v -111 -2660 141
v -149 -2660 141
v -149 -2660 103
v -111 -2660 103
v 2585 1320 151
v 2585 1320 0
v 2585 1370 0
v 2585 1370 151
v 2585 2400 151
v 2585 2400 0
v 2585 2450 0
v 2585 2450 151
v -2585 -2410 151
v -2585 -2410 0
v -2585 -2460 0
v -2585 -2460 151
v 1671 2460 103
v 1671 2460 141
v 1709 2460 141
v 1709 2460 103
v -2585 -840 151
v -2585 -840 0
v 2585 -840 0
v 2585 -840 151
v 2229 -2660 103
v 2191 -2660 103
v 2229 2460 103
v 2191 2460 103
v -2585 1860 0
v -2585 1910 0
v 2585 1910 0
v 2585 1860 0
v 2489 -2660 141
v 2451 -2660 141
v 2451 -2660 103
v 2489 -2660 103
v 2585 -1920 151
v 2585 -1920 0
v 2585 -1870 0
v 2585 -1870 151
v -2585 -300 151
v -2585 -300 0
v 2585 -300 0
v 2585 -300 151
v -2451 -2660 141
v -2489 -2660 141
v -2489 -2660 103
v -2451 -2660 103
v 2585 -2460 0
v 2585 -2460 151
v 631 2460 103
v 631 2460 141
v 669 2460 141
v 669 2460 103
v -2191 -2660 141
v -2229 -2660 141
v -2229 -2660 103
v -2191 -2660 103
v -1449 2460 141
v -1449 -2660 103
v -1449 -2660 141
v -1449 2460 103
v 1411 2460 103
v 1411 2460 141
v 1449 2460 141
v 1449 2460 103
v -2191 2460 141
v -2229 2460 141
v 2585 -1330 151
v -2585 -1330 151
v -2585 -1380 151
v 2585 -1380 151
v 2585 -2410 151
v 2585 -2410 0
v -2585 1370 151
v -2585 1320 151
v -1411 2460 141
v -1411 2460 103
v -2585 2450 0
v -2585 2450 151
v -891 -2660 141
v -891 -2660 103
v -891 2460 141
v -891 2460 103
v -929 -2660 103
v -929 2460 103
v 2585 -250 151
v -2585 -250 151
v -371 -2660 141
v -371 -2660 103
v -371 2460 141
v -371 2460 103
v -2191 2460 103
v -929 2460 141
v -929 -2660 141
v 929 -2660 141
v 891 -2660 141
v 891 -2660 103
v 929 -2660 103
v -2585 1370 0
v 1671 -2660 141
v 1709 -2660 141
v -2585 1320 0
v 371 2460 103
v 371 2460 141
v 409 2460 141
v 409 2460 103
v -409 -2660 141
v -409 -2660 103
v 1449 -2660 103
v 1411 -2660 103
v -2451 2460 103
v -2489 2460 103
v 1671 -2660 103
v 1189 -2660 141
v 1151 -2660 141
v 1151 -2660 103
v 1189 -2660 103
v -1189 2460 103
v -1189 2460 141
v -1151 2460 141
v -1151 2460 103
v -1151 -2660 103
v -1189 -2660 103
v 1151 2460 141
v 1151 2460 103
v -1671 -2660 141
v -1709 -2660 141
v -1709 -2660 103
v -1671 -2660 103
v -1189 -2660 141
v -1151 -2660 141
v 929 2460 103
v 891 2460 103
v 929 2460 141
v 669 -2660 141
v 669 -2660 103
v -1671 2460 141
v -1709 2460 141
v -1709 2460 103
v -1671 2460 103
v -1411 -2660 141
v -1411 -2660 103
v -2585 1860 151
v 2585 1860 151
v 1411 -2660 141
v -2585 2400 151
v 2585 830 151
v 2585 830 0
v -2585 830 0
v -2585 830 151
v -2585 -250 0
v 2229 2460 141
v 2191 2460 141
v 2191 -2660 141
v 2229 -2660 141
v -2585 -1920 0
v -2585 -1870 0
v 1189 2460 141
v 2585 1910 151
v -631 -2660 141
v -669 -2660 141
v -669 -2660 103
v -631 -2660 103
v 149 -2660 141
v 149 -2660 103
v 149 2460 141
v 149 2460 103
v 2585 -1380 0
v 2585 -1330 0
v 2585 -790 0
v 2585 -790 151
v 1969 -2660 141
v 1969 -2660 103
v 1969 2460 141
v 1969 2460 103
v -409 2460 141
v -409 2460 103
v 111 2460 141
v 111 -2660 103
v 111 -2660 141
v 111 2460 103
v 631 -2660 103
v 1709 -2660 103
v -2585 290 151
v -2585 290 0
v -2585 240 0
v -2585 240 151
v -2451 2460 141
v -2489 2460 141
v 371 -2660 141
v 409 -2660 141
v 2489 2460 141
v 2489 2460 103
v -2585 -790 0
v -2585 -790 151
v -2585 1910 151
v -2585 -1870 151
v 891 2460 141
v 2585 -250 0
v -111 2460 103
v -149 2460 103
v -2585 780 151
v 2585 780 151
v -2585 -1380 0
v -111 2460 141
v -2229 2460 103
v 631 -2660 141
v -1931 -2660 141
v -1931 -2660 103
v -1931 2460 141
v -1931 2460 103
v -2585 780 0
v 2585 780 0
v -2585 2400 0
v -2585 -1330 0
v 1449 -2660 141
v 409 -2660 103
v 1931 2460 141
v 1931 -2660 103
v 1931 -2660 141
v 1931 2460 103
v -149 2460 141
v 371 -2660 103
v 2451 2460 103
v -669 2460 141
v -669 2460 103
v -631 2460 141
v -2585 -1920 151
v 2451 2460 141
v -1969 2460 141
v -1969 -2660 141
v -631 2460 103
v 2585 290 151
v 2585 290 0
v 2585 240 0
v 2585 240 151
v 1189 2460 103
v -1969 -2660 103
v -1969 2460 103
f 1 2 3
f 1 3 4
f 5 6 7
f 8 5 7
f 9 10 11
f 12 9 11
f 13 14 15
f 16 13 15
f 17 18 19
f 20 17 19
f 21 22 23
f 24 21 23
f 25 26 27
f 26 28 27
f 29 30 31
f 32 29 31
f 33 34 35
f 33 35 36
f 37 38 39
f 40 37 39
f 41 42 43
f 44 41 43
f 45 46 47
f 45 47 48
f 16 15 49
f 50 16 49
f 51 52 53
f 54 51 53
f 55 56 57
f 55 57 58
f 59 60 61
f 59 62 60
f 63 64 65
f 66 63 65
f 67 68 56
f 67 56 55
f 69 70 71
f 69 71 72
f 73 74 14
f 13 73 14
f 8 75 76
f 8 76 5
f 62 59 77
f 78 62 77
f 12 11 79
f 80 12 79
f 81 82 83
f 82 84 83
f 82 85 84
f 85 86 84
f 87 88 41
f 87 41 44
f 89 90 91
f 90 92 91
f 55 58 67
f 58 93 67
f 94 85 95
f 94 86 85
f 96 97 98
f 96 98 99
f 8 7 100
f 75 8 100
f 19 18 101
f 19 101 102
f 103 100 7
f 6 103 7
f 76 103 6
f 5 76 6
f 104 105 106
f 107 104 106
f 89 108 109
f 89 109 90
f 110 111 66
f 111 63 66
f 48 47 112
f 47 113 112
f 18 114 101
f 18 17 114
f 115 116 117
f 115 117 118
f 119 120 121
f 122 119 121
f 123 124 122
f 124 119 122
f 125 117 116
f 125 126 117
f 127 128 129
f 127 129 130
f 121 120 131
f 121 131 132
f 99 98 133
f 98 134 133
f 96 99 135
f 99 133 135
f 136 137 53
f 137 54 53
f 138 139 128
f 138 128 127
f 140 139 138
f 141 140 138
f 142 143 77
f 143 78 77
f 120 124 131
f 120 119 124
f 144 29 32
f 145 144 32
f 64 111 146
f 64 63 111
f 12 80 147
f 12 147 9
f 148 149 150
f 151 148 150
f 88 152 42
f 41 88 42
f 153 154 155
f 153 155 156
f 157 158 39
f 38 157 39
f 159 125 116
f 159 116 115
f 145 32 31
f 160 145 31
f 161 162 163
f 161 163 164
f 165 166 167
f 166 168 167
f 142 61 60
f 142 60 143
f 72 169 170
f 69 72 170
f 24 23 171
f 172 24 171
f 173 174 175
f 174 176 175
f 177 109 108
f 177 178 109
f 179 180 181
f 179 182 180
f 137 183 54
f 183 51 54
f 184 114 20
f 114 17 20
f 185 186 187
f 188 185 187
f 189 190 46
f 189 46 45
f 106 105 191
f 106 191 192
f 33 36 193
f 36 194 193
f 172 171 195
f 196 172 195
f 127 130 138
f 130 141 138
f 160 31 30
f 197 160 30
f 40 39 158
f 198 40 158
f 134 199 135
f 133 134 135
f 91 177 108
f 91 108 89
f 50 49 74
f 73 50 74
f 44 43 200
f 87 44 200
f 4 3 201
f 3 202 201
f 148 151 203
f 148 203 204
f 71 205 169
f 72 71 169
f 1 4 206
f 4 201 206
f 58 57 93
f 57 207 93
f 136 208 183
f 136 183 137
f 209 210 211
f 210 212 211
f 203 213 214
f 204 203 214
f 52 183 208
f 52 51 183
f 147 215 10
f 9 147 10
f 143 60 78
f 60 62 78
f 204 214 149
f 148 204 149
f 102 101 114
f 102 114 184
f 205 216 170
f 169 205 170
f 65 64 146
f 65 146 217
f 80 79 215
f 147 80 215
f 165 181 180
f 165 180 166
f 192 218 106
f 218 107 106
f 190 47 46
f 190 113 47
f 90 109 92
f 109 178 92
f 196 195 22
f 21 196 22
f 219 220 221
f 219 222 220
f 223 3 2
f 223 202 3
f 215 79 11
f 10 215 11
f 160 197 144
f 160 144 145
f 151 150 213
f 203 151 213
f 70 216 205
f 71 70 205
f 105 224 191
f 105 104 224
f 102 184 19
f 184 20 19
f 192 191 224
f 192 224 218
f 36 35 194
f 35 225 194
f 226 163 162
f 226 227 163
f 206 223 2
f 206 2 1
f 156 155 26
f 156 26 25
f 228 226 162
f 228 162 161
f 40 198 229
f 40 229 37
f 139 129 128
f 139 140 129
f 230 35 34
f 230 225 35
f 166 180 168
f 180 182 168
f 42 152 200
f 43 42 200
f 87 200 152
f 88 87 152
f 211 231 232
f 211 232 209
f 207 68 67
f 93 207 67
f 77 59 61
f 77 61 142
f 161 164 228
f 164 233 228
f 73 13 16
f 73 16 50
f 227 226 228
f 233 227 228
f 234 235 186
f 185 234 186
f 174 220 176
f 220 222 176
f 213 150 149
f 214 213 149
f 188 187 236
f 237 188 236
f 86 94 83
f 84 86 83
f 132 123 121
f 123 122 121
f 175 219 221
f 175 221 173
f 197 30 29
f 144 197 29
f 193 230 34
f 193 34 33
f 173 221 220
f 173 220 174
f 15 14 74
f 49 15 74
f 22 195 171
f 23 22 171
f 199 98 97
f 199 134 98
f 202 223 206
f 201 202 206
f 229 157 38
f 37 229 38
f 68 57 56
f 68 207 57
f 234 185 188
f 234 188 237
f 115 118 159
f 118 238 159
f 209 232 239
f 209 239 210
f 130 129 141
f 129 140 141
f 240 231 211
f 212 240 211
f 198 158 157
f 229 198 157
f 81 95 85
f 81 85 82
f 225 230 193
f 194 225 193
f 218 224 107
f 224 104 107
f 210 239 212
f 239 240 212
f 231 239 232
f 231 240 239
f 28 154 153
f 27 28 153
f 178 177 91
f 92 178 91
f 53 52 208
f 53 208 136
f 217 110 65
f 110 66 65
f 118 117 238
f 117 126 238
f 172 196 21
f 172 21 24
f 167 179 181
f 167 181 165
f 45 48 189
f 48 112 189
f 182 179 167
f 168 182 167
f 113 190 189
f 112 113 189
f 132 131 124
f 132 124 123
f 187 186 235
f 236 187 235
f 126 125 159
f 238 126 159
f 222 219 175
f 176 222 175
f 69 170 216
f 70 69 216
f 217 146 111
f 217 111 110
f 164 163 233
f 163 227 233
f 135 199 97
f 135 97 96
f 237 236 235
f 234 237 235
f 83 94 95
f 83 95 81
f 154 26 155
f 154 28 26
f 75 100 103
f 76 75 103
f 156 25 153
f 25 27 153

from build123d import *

# Parameters (mm, degrees)
F1_DEPTH      = 151
F2_W          = 38
F2_H          = 38
F3_DEPTH      = 4920
F3_DEPTH_BACK = 200


with BuildPart() as f1:
    # F0 (on Top) → F1 (new body)
    with BuildSketch(Plane.XY):
        Polygon((-2535, -2460), (2585, -2460), (2585, -2410), (-2535, -2410), (-2560, -2410), (-2585, -2410), (-2585, -2460), (-2560, -2460), align=None)
    extrude(amount=F1_DEPTH)


with BuildPart() as f1b:
    # F0 (on Top) → F1, piece 2 (new body)
    with BuildSketch(Plane.XY):
        Polygon((-2535, -1920), (2585, -1920), (2585, -1870), (-2535, -1870), (-2560, -1870), (-2585, -1870), (-2585, -1920), (-2560, -1920), align=None)
    extrude(amount=F1_DEPTH)


with BuildPart() as f1c:
    # F0 (on Top) → F1, piece 3 (new body)
    with BuildSketch(Plane.XY):
        Polygon((-2535, -1380), (2585, -1380), (2585, -1330), (-2535, -1330), (-2560, -1330), (-2585, -1330), (-2585, -1380), (-2560, -1380), align=None)
    extrude(amount=F1_DEPTH)


with BuildPart() as f1d:
    # F0 (on Top) → F1, piece 4 (new body)
    with BuildSketch(Plane.XY):
        Polygon((-2535, -840), (2585, -840), (2585, -790), (-2535, -790), (-2560, -790), (-2585, -790), (-2585, -840), (-2560, -840), align=None)
    extrude(amount=F1_DEPTH)


with BuildPart() as f1e:
    # F0 (on Top) → F1, piece 5 (new body)
    with BuildSketch(Plane.XY):
        Polygon((-2535, -300), (2585, -300), (2585, -250), (-2535, -250), (-2560, -250), (-2585, -250), (-2585, -300), (-2560, -300), align=None)
    extrude(amount=F1_DEPTH)


with BuildPart() as f1f:
    # F0 (on Top) → F1, piece 6 (new body)
    with BuildSketch(Plane.XY):
        Polygon((-2535, 240), (2585, 240), (2585, 290), (-2535, 290), (-2560, 290), (-2585, 290), (-2585, 240), (-2560, 240), align=None)
    extrude(amount=F1_DEPTH)


with BuildPart() as f1g:
    # F0 (on Top) → F1, piece 7 (new body)
    with BuildSketch(Plane.XY):
        Polygon((-2535, 780), (2585, 780), (2585, 830), (-2535, 830), (-2560, 830), (-2585, 830), (-2585, 780), (-2560, 780), align=None)
    extrude(amount=F1_DEPTH)


with BuildPart() as f1h:
    # F0 (on Top) → F1, piece 8 (new body)
    with BuildSketch(Plane.XY):
        Polygon((-2535, 1320), (2585, 1320), (2585, 1370), (-2535, 1370), (-2560, 1370), (-2585, 1370), (-2585, 1320), (-2560, 1320), align=None)
    extrude(amount=F1_DEPTH)


with BuildPart() as f1i:
    # F0 (on Top) → F1, piece 9 (new body)
    with BuildSketch(Plane.XY):
        Polygon((-2535, 1860), (2585, 1860), (2585, 1910), (-2535, 1910), (-2560, 1910), (-2585, 1910), (-2585, 1860), (-2560, 1860), align=None)
    extrude(amount=F1_DEPTH)


with BuildPart() as f1j:
    # F0 (on Top) → F1, piece 10 (new body)
    with BuildSketch(Plane.XY):
        Polygon((-2535, 2400), (2585, 2400), (2585, 2450), (-2535, 2450), (-2560, 2450), (-2585, 2450), (-2585, 2400), (-2560, 2400), align=None)
    extrude(amount=F1_DEPTH)


with BuildPart() as f3:
    # F2 (on face) → F3 (new body, two sides)
    with BuildSketch(Plane.XZ.offset(2460)) as f3_sk:
        with Locations((2470, 122)):
            Rectangle(F2_W, F2_H)
    extrude(amount=-F3_DEPTH)
    extrude(f3_sk.sketch, amount=F3_DEPTH_BACK)


with BuildPart() as f3b:
    # F2 (on face) → F3, piece 2 (new body, two sides)
    with BuildSketch(Plane.XZ.offset(2460)) as f3_2_sk:
        with Locations((2210, 122)):
            Rectangle(F2_W, F2_H)
    extrude(amount=-F3_DEPTH)
    extrude(f3_2_sk.sketch, amount=F3_DEPTH_BACK)


with BuildPart() as f3c:
    # F2 (on face) → F3, piece 3 (new body, two sides)
    with BuildSketch(Plane.XZ.offset(2460)) as f3_3_sk:
        with Locations((1950, 122)):
            Rectangle(F2_W, F2_H)
    extrude(amount=-F3_DEPTH)
    extrude(f3_3_sk.sketch, amount=F3_DEPTH_BACK)


with BuildPart() as f3d:
    # F2 (on face) → F3, piece 4 (new body, two sides)
    with BuildSketch(Plane.XZ.offset(2460)) as f3_4_sk:
        with Locations((1690, 122)):
            Rectangle(F2_W, F2_H)
    extrude(amount=-F3_DEPTH)
    extrude(f3_4_sk.sketch, amount=F3_DEPTH_BACK)


with BuildPart() as f3e:
    # F2 (on face) → F3, piece 5 (new body, two sides)
    with BuildSketch(Plane.XZ.offset(2460)) as f3_5_sk:
        with Locations((1430, 122)):
            Rectangle(F2_W, F2_H)
    extrude(amount=-F3_DEPTH)
    extrude(f3_5_sk.sketch, amount=F3_DEPTH_BACK)


with BuildPart() as f3f:
    # F2 (on face) → F3, piece 6 (new body, two sides)
    with BuildSketch(Plane.XZ.offset(2460)) as f3_6_sk:
        with Locations((1170, 122)):
            Rectangle(F2_W, F2_H)
    extrude(amount=-F3_DEPTH)
    extrude(f3_6_sk.sketch, amount=F3_DEPTH_BACK)


with BuildPart() as f3g:
    # F2 (on face) → F3, piece 7 (new body, two sides)
    with BuildSketch(Plane.XZ.offset(2460)) as f3_7_sk:
        with Locations((910, 122)):
            Rectangle(F2_W, F2_H)
    extrude(amount=-F3_DEPTH)
    extrude(f3_7_sk.sketch, amount=F3_DEPTH_BACK)


with BuildPart() as f3h:
    # F2 (on face) → F3, piece 8 (new body, two sides)
    with BuildSketch(Plane.XZ.offset(2460)) as f3_8_sk:
        with Locations((650, 122)):
            Rectangle(F2_W, F2_H)
    extrude(amount=-F3_DEPTH)
    extrude(f3_8_sk.sketch, amount=F3_DEPTH_BACK)


with BuildPart() as f3i:
    # F2 (on face) → F3, piece 9 (new body, two sides)
    with BuildSketch(Plane.XZ.offset(2460)) as f3_9_sk:
        with Locations((390, 122)):
            Rectangle(F2_W, F2_H)
    extrude(amount=-F3_DEPTH)
    extrude(f3_9_sk.sketch, amount=F3_DEPTH_BACK)


with BuildPart() as f3j:
    # F2 (on face) → F3, piece 10 (new body, two sides)
    with BuildSketch(Plane.XZ.offset(2460)) as f3_10_sk:
        with Locations((130, 122)):
            Rectangle(F2_W, F2_H)
    extrude(amount=-F3_DEPTH)
    extrude(f3_10_sk.sketch, amount=F3_DEPTH_BACK)


with BuildPart() as f3k:
    # F2 (on face) → F3, piece 11 (new body, two sides)
    with BuildSketch(Plane.XZ.offset(2460)) as f3_11_sk:
        with Locations((-130, 122)):
            Rectangle(F2_W, F2_H)
    extrude(amount=-F3_DEPTH)
    extrude(f3_11_sk.sketch, amount=F3_DEPTH_BACK)


with BuildPart() as f3l:
    # F2 (on face) → F3, piece 12 (new body, two sides)
    with BuildSketch(Plane.XZ.offset(2460)) as f3_12_sk:
        with Locations((-390, 122)):
            Rectangle(F2_W, F2_H)
    extrude(amount=-F3_DEPTH)
    extrude(f3_12_sk.sketch, amount=F3_DEPTH_BACK)


with BuildPart() as f3m:
    # F2 (on face) → F3, piece 13 (new body, two sides)
    with BuildSketch(Plane.XZ.offset(2460)) as f3_13_sk:
        with Locations((-650, 122)):
            Rectangle(F2_W, F2_H)
    extrude(amount=-F3_DEPTH)
    extrude(f3_13_sk.sketch, amount=F3_DEPTH_BACK)


with BuildPart() as f3n:
    # F2 (on face) → F3, piece 14 (new body, two sides)
    with BuildSketch(Plane.XZ.offset(2460)) as f3_14_sk:
        with Locations((-910, 122)):
            Rectangle(F2_W, F2_H)
    extrude(amount=-F3_DEPTH)
    extrude(f3_14_sk.sketch, amount=F3_DEPTH_BACK)


with BuildPart() as f3o:
    # F2 (on face) → F3, piece 15 (new body, two sides)
    with BuildSketch(Plane.XZ.offset(2460)) as f3_15_sk:
        with Locations((-1170, 122)):
            Rectangle(F2_W, F2_H)
    extrude(amount=-F3_DEPTH)
    extrude(f3_15_sk.sketch, amount=F3_DEPTH_BACK)


with BuildPart() as f3p:
    # F2 (on face) → F3, piece 16 (new body, two sides)
    with BuildSketch(Plane.XZ.offset(2460)) as f3_16_sk:
        with Locations((-1430, 122)):
            Rectangle(F2_W, F2_H)
    extrude(amount=-F3_DEPTH)
    extrude(f3_16_sk.sketch, amount=F3_DEPTH_BACK)


with BuildPart() as f3q:
    # F2 (on face) → F3, piece 17 (new body, two sides)
    with BuildSketch(Plane.XZ.offset(2460)) as f3_17_sk:
        with Locations((-1690, 122)):
            Rectangle(F2_W, F2_H)
    extrude(amount=-F3_DEPTH)
    extrude(f3_17_sk.sketch, amount=F3_DEPTH_BACK)


with BuildPart() as f3r:
    # F2 (on face) → F3, piece 18 (new body, two sides)
    with BuildSketch(Plane.XZ.offset(2460)) as f3_18_sk:
        with Locations((-1950, 122)):
            Rectangle(F2_W, F2_H)
    extrude(amount=-F3_DEPTH)
    extrude(f3_18_sk.sketch, amount=F3_DEPTH_BACK)


with BuildPart() as f3s:
    # F2 (on face) → F3, piece 19 (new body, two sides)
    with BuildSketch(Plane.XZ.offset(2460)) as f3_19_sk:
        with Locations((-2210, 122)):
            Rectangle(F2_W, F2_H)
    extrude(amount=-F3_DEPTH)
    extrude(f3_19_sk.sketch, amount=F3_DEPTH_BACK)


with BuildPart() as f3t:
    # F2 (on face) → F3, piece 20 (new body, two sides)
    with BuildSketch(Plane.XZ.offset(2460)) as f3_20_sk:
        with Locations((-2470, 122)):
            Rectangle(F2_W, F2_H)
    extrude(amount=-F3_DEPTH)
    extrude(f3_20_sk.sketch, amount=F3_DEPTH_BACK)


solid = Compound([f1.part, f1b.part, f1c.part, f1d.part, f1e.part, f1f.part, f1g.part, f1h.part, f1i.part, f1j.part, f3.part, f3b.part, f3c.part, f3d.part, f3e.part, f3f.part, f3g.part, f3h.part, f3i.part, f3j.part, f3k.part, f3l.part, f3m.part, f3n.part, f3o.part, f3p.part, f3q.part, f3r.part, f3s.part, f3t.part])
